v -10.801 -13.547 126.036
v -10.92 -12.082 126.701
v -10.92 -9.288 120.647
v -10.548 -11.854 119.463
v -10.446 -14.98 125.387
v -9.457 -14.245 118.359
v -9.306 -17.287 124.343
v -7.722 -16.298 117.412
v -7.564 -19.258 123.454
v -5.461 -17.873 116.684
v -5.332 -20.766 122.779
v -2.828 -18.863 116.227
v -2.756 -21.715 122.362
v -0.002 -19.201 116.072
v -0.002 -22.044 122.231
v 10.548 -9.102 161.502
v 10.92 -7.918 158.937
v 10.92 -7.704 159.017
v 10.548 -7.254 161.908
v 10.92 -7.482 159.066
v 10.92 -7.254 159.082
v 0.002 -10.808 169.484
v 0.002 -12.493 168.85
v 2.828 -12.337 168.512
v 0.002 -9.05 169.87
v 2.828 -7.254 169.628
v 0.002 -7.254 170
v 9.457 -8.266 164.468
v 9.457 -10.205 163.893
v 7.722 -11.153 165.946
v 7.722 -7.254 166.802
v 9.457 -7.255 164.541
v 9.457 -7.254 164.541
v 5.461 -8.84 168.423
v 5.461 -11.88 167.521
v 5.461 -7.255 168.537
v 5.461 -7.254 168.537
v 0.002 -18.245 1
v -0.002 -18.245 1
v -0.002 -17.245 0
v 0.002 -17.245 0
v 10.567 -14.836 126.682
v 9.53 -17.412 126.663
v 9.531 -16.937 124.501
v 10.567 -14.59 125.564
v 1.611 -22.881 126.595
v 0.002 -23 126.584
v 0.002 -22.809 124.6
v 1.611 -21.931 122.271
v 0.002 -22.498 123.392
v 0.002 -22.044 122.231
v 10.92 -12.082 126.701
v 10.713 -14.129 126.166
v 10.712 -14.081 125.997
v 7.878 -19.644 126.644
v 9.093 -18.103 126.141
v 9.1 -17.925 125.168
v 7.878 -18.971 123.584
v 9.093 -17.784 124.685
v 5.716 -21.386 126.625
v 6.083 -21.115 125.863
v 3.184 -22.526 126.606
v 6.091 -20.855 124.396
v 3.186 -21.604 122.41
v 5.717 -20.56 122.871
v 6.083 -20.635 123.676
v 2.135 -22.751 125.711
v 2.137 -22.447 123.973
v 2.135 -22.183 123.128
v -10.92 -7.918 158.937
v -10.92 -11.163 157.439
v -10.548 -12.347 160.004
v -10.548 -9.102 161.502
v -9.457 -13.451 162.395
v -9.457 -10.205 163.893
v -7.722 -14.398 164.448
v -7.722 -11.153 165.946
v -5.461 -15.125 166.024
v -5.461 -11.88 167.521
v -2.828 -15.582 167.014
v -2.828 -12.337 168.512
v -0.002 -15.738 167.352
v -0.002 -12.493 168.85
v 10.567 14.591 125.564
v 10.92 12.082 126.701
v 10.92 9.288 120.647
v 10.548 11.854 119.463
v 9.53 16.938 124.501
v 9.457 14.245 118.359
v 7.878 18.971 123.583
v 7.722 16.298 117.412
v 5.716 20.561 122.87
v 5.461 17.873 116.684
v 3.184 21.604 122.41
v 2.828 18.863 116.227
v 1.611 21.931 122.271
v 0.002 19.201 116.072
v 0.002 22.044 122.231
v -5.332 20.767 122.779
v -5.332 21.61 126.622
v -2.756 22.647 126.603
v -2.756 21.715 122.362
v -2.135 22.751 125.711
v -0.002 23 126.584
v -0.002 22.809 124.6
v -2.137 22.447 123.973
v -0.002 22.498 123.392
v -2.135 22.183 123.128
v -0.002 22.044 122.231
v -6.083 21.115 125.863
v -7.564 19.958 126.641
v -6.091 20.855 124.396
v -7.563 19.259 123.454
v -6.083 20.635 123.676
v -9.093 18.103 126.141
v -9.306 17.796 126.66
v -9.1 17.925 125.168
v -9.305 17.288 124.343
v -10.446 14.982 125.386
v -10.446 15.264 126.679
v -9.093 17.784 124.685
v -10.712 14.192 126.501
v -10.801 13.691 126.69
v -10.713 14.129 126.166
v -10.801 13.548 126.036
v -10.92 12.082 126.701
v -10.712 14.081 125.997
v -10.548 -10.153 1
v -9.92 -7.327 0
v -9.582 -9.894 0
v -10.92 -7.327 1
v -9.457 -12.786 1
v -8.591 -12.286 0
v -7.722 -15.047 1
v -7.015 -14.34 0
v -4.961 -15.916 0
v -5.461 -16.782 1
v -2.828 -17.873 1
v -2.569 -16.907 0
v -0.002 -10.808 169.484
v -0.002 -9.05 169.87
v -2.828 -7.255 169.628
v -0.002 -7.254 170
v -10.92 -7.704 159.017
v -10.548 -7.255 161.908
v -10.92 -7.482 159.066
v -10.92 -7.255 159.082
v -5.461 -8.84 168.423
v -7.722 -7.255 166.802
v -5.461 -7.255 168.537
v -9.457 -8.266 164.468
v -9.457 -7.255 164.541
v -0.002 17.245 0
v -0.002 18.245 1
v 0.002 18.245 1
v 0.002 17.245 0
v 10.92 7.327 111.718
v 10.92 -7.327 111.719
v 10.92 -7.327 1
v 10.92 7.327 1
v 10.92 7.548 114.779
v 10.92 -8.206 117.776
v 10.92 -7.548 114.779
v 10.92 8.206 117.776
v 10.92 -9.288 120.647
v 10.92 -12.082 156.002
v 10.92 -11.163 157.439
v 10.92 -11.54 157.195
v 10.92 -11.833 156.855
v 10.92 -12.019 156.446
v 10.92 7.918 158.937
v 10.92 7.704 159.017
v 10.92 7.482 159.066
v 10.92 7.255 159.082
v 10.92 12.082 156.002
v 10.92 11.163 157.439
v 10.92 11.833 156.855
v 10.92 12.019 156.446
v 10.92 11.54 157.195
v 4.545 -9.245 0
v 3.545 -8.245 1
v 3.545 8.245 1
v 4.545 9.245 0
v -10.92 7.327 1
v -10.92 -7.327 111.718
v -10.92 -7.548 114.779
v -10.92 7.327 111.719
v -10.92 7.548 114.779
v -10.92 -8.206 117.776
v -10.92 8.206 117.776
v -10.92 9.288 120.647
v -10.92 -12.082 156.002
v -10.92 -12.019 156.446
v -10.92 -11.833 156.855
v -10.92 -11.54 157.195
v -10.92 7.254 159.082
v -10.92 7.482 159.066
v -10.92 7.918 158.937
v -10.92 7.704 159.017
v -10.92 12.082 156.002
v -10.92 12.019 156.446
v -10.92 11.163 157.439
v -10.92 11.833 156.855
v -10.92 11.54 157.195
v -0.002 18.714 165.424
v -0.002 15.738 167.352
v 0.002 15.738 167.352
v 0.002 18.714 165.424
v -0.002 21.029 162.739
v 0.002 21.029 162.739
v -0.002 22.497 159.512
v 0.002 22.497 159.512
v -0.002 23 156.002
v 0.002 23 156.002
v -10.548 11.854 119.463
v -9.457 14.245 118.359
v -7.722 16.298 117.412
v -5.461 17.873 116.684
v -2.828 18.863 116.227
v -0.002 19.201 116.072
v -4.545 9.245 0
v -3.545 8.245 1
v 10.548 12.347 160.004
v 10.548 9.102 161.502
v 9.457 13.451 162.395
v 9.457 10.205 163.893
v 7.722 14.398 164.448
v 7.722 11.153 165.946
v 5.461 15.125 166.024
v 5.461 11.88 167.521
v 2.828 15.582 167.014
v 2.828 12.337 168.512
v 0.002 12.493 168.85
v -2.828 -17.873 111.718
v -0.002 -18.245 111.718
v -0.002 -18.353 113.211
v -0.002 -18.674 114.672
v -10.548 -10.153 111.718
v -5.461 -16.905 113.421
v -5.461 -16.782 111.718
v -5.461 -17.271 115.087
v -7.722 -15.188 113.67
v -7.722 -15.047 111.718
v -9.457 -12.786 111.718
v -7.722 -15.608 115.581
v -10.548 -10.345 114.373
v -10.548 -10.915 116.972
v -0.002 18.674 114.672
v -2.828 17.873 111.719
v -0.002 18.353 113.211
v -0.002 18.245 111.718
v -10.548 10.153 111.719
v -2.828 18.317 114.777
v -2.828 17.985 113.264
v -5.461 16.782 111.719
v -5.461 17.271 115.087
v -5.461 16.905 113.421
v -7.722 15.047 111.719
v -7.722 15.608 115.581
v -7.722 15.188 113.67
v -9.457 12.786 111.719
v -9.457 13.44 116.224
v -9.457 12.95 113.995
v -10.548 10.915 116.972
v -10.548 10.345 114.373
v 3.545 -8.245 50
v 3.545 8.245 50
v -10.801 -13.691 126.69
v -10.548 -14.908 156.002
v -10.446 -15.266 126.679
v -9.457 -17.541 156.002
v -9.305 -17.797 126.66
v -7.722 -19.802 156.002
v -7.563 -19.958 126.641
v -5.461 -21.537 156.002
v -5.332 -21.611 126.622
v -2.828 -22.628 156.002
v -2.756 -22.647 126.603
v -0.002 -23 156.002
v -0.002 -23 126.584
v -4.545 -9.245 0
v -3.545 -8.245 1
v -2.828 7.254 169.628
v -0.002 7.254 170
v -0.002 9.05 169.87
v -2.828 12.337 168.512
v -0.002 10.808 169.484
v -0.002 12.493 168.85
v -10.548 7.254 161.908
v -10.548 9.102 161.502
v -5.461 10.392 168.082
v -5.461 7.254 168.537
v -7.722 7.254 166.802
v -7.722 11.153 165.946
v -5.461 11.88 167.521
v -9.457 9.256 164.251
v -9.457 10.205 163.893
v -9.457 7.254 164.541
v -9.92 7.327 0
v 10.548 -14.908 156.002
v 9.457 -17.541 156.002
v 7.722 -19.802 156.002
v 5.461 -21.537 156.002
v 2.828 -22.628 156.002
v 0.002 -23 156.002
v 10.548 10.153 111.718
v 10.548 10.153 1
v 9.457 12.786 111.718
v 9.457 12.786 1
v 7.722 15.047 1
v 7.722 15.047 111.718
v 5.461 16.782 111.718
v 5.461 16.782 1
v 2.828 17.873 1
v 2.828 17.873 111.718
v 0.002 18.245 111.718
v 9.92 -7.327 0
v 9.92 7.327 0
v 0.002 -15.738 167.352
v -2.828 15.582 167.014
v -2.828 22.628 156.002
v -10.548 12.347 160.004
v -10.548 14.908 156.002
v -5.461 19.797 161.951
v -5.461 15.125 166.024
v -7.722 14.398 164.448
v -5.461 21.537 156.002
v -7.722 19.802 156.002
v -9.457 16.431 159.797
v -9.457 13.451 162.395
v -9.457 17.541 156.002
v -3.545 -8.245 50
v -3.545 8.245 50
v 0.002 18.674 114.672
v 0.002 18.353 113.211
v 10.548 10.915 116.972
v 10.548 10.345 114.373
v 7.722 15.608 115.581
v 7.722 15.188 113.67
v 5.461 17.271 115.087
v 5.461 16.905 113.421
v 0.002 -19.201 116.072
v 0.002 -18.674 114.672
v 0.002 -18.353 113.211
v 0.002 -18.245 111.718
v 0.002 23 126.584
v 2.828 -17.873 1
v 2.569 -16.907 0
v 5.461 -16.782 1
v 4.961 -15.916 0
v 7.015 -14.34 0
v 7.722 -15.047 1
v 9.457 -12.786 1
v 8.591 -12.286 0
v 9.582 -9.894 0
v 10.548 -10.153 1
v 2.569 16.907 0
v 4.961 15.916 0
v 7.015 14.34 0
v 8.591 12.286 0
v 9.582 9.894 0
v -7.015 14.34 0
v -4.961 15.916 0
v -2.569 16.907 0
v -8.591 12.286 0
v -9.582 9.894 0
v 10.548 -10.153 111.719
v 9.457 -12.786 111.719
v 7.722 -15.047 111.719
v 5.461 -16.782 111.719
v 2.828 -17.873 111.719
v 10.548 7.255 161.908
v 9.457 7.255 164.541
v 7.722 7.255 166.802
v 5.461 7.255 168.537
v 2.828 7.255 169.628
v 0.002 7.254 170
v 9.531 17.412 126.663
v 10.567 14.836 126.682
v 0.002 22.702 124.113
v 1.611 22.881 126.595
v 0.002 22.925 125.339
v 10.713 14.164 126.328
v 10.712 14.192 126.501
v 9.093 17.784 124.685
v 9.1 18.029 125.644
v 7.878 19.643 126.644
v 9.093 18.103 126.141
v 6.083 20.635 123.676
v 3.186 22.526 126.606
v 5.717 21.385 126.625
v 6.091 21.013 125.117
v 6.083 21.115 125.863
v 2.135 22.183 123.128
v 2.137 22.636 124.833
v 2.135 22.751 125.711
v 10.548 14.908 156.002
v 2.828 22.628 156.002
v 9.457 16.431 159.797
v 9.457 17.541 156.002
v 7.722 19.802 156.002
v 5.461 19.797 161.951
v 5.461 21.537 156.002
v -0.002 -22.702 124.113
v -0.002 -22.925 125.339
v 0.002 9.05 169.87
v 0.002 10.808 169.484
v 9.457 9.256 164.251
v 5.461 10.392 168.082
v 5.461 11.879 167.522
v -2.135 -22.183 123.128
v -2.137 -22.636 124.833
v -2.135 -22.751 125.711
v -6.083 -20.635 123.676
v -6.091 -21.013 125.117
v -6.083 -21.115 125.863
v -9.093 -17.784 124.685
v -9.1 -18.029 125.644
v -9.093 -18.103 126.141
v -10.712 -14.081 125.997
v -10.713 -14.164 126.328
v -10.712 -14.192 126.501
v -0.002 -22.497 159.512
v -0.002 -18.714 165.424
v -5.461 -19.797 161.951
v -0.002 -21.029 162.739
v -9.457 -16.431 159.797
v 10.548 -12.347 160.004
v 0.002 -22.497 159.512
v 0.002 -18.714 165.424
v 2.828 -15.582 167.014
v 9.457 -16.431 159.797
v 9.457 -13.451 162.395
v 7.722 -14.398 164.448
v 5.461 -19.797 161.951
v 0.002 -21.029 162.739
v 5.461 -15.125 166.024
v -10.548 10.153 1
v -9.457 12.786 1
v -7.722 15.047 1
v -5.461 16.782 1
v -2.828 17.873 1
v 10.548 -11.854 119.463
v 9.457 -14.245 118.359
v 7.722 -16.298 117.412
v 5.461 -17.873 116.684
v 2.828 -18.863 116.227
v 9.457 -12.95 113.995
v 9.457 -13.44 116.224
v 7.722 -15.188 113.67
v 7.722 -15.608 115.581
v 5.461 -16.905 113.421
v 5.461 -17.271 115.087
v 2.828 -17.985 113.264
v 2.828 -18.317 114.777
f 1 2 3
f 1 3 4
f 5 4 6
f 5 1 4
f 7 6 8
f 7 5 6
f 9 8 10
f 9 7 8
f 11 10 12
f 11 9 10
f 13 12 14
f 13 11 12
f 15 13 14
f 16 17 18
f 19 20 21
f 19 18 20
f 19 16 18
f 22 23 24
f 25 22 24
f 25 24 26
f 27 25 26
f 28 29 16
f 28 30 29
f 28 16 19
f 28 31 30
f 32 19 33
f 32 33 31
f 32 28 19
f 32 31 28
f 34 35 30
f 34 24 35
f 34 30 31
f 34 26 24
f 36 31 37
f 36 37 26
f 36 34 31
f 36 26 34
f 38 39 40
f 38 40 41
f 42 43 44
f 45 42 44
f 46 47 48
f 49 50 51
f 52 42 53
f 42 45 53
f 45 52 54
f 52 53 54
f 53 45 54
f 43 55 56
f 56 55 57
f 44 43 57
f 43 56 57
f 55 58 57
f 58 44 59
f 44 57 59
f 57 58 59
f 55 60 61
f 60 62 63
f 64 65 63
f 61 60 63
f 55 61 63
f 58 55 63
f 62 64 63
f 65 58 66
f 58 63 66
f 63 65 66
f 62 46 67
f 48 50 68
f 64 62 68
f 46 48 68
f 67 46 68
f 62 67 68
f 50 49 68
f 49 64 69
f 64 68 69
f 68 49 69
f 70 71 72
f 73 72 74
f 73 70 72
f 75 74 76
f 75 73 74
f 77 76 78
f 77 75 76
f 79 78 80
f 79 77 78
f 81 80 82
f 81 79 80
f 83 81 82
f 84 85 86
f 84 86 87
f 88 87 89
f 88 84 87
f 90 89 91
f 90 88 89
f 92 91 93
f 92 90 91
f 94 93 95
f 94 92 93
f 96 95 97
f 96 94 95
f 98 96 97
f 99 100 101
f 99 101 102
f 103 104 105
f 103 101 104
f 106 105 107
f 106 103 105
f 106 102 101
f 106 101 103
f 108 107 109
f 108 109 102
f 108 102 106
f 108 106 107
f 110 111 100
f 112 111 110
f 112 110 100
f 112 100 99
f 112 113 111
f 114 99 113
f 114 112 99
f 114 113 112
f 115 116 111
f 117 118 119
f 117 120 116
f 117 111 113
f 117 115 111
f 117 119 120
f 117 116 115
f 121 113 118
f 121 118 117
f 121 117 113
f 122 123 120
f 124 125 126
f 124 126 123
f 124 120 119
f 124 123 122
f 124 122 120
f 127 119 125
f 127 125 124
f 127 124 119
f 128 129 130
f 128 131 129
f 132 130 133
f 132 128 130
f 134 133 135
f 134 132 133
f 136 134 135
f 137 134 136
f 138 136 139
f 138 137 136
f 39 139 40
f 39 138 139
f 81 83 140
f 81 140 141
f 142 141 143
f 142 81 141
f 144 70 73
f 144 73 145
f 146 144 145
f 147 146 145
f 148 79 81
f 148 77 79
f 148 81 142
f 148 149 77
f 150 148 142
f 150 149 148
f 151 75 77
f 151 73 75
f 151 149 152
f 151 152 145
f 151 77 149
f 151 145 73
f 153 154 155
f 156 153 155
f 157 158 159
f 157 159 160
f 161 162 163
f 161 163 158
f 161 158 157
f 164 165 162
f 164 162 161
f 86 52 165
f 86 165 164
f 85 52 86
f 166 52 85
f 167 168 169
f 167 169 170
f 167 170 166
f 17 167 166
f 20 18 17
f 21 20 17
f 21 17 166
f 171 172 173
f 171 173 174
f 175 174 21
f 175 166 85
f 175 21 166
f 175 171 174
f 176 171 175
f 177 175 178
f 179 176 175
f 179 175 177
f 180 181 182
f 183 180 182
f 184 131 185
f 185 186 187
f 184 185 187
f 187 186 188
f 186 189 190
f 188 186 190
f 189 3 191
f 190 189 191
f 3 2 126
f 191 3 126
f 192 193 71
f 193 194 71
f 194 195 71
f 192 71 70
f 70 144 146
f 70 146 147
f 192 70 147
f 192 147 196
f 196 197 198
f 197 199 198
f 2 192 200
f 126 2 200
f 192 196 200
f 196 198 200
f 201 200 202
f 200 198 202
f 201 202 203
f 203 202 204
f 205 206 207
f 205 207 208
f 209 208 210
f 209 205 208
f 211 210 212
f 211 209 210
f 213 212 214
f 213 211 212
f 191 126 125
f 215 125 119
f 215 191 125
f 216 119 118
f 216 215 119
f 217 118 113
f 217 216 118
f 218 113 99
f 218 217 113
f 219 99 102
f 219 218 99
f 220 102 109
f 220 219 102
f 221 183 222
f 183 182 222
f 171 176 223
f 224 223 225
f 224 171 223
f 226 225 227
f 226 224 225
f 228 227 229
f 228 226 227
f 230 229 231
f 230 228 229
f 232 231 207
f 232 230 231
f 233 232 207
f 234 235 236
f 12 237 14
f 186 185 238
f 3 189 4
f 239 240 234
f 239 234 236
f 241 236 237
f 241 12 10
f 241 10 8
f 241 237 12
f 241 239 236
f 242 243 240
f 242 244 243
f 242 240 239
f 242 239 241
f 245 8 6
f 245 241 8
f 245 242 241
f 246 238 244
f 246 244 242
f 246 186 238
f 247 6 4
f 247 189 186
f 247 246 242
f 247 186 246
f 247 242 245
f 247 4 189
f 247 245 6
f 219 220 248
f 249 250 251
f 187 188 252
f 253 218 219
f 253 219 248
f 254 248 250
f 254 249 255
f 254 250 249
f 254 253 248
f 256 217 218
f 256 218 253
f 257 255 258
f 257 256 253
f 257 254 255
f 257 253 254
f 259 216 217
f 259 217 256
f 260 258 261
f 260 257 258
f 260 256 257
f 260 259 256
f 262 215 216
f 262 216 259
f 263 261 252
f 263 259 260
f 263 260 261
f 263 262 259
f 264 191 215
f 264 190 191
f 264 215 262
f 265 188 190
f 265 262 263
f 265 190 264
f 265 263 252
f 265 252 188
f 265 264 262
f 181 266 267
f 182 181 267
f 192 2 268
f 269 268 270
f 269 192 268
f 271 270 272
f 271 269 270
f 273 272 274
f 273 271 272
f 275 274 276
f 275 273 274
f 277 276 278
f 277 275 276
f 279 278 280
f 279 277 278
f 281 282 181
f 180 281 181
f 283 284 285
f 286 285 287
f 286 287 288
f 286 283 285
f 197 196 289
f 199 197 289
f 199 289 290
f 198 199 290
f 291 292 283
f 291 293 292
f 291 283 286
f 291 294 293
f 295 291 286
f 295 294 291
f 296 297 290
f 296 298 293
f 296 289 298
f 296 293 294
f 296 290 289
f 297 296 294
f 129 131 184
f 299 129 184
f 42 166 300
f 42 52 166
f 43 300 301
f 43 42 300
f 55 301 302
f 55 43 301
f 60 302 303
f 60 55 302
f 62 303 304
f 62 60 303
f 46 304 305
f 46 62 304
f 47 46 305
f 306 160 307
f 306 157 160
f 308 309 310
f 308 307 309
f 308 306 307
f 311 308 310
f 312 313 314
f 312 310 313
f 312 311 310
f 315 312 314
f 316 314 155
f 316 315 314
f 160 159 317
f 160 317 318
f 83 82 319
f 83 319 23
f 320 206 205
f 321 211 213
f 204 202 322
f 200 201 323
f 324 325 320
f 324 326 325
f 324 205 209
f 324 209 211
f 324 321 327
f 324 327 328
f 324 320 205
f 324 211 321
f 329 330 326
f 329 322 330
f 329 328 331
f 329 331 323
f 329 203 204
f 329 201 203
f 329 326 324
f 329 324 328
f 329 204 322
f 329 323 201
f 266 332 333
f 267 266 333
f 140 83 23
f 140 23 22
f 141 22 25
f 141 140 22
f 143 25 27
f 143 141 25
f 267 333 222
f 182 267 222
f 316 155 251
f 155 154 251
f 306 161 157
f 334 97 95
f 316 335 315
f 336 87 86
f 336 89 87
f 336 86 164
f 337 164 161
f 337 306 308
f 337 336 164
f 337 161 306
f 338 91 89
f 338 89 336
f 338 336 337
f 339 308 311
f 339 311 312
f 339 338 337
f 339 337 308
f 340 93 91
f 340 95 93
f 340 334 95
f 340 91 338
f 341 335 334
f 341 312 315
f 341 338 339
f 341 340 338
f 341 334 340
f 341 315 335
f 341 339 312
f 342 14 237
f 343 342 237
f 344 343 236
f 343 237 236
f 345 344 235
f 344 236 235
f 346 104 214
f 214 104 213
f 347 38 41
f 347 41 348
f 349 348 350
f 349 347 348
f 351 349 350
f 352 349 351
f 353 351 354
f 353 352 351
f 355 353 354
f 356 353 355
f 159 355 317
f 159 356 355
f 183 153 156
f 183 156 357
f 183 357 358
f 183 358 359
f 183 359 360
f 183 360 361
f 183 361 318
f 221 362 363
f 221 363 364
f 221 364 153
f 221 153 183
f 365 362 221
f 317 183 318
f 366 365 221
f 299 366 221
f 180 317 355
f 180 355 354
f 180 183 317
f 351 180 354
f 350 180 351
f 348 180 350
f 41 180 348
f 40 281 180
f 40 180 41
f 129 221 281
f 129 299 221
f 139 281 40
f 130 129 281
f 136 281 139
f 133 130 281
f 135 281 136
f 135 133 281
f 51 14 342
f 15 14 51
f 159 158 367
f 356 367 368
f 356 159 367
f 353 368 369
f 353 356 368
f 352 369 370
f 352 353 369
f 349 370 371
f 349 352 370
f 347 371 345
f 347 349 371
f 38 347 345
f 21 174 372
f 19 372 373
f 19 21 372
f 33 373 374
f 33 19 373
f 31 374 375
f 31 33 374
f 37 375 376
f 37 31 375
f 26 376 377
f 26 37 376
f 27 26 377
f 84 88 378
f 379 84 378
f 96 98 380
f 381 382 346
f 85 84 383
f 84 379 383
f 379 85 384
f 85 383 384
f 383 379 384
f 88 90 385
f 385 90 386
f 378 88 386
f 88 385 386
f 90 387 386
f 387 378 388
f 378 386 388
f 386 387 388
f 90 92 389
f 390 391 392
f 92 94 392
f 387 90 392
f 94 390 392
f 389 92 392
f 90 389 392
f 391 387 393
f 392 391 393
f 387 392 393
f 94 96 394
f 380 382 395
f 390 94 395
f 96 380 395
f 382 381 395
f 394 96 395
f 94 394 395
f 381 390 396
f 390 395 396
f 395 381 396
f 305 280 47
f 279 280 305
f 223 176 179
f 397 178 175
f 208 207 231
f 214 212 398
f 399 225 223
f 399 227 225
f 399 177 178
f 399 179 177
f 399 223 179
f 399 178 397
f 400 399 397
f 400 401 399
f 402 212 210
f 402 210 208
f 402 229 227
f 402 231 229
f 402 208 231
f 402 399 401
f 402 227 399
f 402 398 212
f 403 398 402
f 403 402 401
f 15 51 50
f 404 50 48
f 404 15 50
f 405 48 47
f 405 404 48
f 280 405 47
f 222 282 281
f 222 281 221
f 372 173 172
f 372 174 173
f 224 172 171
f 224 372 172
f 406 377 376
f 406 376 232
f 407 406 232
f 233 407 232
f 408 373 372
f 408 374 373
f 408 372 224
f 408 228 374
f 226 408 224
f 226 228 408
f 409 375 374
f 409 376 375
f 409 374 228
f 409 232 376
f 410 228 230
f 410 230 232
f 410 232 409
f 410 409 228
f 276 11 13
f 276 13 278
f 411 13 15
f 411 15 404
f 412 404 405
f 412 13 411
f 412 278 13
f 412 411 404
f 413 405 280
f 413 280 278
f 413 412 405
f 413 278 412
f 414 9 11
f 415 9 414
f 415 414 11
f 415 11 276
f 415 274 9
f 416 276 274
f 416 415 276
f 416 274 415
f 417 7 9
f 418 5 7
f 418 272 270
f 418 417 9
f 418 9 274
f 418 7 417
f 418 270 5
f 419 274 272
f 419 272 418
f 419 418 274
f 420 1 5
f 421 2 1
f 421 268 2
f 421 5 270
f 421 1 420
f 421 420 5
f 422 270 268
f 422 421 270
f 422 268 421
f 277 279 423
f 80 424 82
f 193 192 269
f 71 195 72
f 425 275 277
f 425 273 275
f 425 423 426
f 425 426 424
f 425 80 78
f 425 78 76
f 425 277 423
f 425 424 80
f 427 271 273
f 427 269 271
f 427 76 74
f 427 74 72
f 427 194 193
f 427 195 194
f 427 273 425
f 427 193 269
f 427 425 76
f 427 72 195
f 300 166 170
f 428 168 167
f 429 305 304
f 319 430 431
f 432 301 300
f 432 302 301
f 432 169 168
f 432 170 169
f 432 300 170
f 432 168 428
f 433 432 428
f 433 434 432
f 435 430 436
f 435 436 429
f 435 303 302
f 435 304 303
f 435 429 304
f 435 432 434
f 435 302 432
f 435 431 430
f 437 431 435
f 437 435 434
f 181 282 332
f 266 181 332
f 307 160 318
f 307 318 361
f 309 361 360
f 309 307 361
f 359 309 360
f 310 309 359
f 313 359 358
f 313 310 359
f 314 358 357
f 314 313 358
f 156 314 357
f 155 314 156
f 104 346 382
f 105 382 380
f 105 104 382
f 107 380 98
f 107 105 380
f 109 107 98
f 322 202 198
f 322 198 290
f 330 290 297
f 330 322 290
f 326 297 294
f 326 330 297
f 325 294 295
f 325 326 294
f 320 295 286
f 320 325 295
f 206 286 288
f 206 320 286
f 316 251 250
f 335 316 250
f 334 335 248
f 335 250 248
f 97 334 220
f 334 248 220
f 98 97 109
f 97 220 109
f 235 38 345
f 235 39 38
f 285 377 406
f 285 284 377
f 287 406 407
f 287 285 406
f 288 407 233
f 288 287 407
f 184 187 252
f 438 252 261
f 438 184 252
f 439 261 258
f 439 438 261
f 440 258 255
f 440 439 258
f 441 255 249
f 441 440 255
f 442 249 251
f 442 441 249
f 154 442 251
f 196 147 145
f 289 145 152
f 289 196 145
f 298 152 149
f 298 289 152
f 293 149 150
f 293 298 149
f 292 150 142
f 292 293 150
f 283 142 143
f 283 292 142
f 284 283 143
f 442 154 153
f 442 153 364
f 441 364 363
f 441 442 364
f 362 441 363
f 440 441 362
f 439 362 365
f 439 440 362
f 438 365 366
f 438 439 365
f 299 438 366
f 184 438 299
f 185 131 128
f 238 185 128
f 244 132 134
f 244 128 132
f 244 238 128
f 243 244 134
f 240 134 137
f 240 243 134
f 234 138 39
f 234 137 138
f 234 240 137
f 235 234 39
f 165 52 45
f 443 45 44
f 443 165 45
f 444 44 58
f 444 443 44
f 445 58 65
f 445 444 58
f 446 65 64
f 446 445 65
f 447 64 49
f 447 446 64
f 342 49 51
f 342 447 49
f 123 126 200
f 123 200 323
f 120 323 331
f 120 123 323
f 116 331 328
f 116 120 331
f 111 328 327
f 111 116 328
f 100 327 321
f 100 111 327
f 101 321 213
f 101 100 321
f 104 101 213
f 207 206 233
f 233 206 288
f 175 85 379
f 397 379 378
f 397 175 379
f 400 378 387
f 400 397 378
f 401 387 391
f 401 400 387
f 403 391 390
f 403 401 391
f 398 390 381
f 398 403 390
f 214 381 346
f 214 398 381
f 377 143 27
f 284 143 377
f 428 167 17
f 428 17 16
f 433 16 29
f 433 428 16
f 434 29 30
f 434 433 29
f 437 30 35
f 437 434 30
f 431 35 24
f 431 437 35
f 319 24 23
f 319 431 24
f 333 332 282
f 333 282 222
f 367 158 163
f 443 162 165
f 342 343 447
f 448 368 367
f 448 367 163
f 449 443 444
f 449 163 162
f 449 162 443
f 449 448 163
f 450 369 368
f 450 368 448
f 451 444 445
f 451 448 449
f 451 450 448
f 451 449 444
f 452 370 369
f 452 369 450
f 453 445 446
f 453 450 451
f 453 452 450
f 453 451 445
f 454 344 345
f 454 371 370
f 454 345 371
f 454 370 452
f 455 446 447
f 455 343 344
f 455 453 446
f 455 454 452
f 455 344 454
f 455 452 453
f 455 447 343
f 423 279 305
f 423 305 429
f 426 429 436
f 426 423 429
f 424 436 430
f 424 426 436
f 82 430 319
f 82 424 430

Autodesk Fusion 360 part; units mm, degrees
sketch "Schizzo1" plane through (0, 0, 0) normal (1, 0, 0) x (0, 1, 0)
  line L0 (18.245, 0) -> (18.245, 111.7185)
  line L1 (19.2011, 116.0715) -> (22.0439, 122.231)
  line L2 (23, 126.584) -> (23, 156.0021)
  line L3 (15.7382, 167.3516) -> (12.4928, 168.8495)
  line L4 (7.2545, 170) -> (0, 170)
  line L5 (18.245, 0) -> (0, 0)
  line L6 (0, 0) -> (0, 170) construction
  arc A0 (12.4928, 168.8495) -> (7.2545, 170) centre (7.2545, 157.5) ccw
  arc A1 (23, 156.0021) -> (15.7382, 167.3516) centre (10.5, 156.0021) ccw
  arc A2 (22.0439, 122.231) -> (23, 126.584) centre (12.6125, 126.584) ccw
  arc A3 (19.2011, 116.0715) -> (18.245, 111.7185) centre (28.6325, 111.7185) ccw
  line L7 (-18.245, 0) -> (0, 0)
  arc A4 (-18.245, 111.7185) -> (-19.2011, 116.0715) centre (-28.6325, 111.7185) ccw
  line L8 (-19.2011, 116.0715) -> (-22.0439, 122.231)
  arc A5 (-23, 126.584) -> (-22.0439, 122.231) centre (-12.6125, 126.584) ccw
  line L9 (-23, 126.584) -> (-23, 156.0021)
  arc A6 (-15.7382, 167.3516) -> (-23, 156.0021) centre (-10.5, 156.0021) ccw
  line L10 (-15.7382, 167.3516) -> (-12.4928, 168.8495)
  arc A7 (-7.2545, 170) -> (-12.4928, 168.8495) centre (-7.2545, 157.5) ccw
  line L11 (-7.2545, 170) -> (0, 170)
  line L12 (-18.245, 0) -> (-18.245, 111.7185)
  line L13 (-8.245, 0) -> (-8.245, 50)
  line L14 (-8.245, 50) -> (8.245, 50)
  line L15 (8.245, 50) -> (8.245, 0)
  point P0 (18.245, 114)
  point P1 (23, 124.3025)
  point P2 (23, 164)
  point P3 (10, 170)
  point P4 (0, 50)
  dimension "d1" = 170
  dimension "d2" = 18.245
  dimension "d3" = 56
  dimension "d4" = 10
  dimension "d5" = 23
  dimension "d6" = 23
  dimension "d7" = 6
  dimension "d8" = 12.5
  dimension "d9" = 12.5
  dimension "d10" = 10.3875
  dimension "d16" = 50
  dimension "d17" = 16.49
extrude "Estrusione1" add sketch "Schizzo1" along normal mid plane 21.84
extrude "Estrusione2" cut sketch "Schizzo1" along normal mid plane 7.09 contours L5 L7 L13 L14 L15
fillet "Raccordo1" radius 10.92 34 edges at (-10.92, -18.245, 55.8593) (-10.92, -18.4868, 113.9469) (-10.92, -20.6225, 119.1512) (-10.92, -22.7582, 124.3556) (-10.92, -23, 141.293) (-10.92, -21.0292, 162.739) (-10.92, -14.1155, 168.1005) (-10.92, -9.9361, 169.709) (-10.92, 0, 170) (-10.92, 9.9361, 169.709) (-10.92, 14.1155, 168.1005) (-10.92, 21.0292, 162.739) (-10.92, 23, 141.293) (-10.92, 22.7582, 124.3556) (-10.92, 20.6225, 119.1512) (-10.92, 18.4868, 113.9469) (-10.92, 18.245, 55.8593) (10.92, 18.245, 55.8593) (10.92, 18.4868, 113.9469) (10.92, 20.6225, 119.1512) (10.92, 22.7582, 124.3556) (10.92, 23, 141.293) (10.92, 21.0292, 162.739) (10.92, 14.1155, 168.1005) (10.92, 9.9361, 169.709) (10.92, 0, 170) (10.92, -9.9361, 169.709) (10.92, -14.1155, 168.1005) (10.92, -21.0292, 162.739) (10.92, -23, 141.293) (10.92, -22.7582, 124.3556) (10.92, -20.6225, 119.1512) (10.92, -18.4868, 113.9469) (10.92, -18.245, 55.8593)
chamfer "Smusso1" distance 1 angle 45 4 edges at (-3.545, 0, 0) (0, 8.245, 0) (3.545, 0, 0) (0, -8.245, 0)
chamfer "Smusso1" distance 1 angle 45 4 edges at (0, -18.245, 0) (10.92, 0, 0) (0, 18.245, 0) (-10.92, 0, 0)
equation "d1 = lunghezza_prolunga_freno"
equation "d2 = d17 / 2 + 10 mm"
equation "d5 = d6"
equation "d10 = -d2 * 2.5 + 56 mm"
equation "offset_incastro = 0.25 mm" comment "Modificare questo valore per permettere l'incastro perfetto. (Valore di default 0.25 mm)"
equation "larghezza_incastro = 16.24 mm" comment "Modificare questo valore per allargare o diminuire la larghezza dell'incastro del freno. (Valore di default 16.24 mm)"
equation "spessore_incastro = 6.84 mm" comment "Modificare questo valore per allargare o diminuire lo spessore dell'incastro del freno. (Valore di default 4.1 mm)"
equation "profondita_incastro = 50 mm" comment "Modificare questo valore per allargare o diminuire la profondità dell'incastro del freno. (Valore di default 50 mm)"
equation "lunghezza_prolunga_freno = 170 mm" comment "Modificare questo valore per allungare o accorciare la prolunga del freno. (Valore di default 170 mm)"
equation "d16 = profondita_incastro"
equation "d17 = larghezza_incastro + offset_incastro"
equation "d18 = spessore_incastro + 15 mm"
equation "d20 = spessore_incastro + offset_incastro"
equation "d23 = d18 / 2"
